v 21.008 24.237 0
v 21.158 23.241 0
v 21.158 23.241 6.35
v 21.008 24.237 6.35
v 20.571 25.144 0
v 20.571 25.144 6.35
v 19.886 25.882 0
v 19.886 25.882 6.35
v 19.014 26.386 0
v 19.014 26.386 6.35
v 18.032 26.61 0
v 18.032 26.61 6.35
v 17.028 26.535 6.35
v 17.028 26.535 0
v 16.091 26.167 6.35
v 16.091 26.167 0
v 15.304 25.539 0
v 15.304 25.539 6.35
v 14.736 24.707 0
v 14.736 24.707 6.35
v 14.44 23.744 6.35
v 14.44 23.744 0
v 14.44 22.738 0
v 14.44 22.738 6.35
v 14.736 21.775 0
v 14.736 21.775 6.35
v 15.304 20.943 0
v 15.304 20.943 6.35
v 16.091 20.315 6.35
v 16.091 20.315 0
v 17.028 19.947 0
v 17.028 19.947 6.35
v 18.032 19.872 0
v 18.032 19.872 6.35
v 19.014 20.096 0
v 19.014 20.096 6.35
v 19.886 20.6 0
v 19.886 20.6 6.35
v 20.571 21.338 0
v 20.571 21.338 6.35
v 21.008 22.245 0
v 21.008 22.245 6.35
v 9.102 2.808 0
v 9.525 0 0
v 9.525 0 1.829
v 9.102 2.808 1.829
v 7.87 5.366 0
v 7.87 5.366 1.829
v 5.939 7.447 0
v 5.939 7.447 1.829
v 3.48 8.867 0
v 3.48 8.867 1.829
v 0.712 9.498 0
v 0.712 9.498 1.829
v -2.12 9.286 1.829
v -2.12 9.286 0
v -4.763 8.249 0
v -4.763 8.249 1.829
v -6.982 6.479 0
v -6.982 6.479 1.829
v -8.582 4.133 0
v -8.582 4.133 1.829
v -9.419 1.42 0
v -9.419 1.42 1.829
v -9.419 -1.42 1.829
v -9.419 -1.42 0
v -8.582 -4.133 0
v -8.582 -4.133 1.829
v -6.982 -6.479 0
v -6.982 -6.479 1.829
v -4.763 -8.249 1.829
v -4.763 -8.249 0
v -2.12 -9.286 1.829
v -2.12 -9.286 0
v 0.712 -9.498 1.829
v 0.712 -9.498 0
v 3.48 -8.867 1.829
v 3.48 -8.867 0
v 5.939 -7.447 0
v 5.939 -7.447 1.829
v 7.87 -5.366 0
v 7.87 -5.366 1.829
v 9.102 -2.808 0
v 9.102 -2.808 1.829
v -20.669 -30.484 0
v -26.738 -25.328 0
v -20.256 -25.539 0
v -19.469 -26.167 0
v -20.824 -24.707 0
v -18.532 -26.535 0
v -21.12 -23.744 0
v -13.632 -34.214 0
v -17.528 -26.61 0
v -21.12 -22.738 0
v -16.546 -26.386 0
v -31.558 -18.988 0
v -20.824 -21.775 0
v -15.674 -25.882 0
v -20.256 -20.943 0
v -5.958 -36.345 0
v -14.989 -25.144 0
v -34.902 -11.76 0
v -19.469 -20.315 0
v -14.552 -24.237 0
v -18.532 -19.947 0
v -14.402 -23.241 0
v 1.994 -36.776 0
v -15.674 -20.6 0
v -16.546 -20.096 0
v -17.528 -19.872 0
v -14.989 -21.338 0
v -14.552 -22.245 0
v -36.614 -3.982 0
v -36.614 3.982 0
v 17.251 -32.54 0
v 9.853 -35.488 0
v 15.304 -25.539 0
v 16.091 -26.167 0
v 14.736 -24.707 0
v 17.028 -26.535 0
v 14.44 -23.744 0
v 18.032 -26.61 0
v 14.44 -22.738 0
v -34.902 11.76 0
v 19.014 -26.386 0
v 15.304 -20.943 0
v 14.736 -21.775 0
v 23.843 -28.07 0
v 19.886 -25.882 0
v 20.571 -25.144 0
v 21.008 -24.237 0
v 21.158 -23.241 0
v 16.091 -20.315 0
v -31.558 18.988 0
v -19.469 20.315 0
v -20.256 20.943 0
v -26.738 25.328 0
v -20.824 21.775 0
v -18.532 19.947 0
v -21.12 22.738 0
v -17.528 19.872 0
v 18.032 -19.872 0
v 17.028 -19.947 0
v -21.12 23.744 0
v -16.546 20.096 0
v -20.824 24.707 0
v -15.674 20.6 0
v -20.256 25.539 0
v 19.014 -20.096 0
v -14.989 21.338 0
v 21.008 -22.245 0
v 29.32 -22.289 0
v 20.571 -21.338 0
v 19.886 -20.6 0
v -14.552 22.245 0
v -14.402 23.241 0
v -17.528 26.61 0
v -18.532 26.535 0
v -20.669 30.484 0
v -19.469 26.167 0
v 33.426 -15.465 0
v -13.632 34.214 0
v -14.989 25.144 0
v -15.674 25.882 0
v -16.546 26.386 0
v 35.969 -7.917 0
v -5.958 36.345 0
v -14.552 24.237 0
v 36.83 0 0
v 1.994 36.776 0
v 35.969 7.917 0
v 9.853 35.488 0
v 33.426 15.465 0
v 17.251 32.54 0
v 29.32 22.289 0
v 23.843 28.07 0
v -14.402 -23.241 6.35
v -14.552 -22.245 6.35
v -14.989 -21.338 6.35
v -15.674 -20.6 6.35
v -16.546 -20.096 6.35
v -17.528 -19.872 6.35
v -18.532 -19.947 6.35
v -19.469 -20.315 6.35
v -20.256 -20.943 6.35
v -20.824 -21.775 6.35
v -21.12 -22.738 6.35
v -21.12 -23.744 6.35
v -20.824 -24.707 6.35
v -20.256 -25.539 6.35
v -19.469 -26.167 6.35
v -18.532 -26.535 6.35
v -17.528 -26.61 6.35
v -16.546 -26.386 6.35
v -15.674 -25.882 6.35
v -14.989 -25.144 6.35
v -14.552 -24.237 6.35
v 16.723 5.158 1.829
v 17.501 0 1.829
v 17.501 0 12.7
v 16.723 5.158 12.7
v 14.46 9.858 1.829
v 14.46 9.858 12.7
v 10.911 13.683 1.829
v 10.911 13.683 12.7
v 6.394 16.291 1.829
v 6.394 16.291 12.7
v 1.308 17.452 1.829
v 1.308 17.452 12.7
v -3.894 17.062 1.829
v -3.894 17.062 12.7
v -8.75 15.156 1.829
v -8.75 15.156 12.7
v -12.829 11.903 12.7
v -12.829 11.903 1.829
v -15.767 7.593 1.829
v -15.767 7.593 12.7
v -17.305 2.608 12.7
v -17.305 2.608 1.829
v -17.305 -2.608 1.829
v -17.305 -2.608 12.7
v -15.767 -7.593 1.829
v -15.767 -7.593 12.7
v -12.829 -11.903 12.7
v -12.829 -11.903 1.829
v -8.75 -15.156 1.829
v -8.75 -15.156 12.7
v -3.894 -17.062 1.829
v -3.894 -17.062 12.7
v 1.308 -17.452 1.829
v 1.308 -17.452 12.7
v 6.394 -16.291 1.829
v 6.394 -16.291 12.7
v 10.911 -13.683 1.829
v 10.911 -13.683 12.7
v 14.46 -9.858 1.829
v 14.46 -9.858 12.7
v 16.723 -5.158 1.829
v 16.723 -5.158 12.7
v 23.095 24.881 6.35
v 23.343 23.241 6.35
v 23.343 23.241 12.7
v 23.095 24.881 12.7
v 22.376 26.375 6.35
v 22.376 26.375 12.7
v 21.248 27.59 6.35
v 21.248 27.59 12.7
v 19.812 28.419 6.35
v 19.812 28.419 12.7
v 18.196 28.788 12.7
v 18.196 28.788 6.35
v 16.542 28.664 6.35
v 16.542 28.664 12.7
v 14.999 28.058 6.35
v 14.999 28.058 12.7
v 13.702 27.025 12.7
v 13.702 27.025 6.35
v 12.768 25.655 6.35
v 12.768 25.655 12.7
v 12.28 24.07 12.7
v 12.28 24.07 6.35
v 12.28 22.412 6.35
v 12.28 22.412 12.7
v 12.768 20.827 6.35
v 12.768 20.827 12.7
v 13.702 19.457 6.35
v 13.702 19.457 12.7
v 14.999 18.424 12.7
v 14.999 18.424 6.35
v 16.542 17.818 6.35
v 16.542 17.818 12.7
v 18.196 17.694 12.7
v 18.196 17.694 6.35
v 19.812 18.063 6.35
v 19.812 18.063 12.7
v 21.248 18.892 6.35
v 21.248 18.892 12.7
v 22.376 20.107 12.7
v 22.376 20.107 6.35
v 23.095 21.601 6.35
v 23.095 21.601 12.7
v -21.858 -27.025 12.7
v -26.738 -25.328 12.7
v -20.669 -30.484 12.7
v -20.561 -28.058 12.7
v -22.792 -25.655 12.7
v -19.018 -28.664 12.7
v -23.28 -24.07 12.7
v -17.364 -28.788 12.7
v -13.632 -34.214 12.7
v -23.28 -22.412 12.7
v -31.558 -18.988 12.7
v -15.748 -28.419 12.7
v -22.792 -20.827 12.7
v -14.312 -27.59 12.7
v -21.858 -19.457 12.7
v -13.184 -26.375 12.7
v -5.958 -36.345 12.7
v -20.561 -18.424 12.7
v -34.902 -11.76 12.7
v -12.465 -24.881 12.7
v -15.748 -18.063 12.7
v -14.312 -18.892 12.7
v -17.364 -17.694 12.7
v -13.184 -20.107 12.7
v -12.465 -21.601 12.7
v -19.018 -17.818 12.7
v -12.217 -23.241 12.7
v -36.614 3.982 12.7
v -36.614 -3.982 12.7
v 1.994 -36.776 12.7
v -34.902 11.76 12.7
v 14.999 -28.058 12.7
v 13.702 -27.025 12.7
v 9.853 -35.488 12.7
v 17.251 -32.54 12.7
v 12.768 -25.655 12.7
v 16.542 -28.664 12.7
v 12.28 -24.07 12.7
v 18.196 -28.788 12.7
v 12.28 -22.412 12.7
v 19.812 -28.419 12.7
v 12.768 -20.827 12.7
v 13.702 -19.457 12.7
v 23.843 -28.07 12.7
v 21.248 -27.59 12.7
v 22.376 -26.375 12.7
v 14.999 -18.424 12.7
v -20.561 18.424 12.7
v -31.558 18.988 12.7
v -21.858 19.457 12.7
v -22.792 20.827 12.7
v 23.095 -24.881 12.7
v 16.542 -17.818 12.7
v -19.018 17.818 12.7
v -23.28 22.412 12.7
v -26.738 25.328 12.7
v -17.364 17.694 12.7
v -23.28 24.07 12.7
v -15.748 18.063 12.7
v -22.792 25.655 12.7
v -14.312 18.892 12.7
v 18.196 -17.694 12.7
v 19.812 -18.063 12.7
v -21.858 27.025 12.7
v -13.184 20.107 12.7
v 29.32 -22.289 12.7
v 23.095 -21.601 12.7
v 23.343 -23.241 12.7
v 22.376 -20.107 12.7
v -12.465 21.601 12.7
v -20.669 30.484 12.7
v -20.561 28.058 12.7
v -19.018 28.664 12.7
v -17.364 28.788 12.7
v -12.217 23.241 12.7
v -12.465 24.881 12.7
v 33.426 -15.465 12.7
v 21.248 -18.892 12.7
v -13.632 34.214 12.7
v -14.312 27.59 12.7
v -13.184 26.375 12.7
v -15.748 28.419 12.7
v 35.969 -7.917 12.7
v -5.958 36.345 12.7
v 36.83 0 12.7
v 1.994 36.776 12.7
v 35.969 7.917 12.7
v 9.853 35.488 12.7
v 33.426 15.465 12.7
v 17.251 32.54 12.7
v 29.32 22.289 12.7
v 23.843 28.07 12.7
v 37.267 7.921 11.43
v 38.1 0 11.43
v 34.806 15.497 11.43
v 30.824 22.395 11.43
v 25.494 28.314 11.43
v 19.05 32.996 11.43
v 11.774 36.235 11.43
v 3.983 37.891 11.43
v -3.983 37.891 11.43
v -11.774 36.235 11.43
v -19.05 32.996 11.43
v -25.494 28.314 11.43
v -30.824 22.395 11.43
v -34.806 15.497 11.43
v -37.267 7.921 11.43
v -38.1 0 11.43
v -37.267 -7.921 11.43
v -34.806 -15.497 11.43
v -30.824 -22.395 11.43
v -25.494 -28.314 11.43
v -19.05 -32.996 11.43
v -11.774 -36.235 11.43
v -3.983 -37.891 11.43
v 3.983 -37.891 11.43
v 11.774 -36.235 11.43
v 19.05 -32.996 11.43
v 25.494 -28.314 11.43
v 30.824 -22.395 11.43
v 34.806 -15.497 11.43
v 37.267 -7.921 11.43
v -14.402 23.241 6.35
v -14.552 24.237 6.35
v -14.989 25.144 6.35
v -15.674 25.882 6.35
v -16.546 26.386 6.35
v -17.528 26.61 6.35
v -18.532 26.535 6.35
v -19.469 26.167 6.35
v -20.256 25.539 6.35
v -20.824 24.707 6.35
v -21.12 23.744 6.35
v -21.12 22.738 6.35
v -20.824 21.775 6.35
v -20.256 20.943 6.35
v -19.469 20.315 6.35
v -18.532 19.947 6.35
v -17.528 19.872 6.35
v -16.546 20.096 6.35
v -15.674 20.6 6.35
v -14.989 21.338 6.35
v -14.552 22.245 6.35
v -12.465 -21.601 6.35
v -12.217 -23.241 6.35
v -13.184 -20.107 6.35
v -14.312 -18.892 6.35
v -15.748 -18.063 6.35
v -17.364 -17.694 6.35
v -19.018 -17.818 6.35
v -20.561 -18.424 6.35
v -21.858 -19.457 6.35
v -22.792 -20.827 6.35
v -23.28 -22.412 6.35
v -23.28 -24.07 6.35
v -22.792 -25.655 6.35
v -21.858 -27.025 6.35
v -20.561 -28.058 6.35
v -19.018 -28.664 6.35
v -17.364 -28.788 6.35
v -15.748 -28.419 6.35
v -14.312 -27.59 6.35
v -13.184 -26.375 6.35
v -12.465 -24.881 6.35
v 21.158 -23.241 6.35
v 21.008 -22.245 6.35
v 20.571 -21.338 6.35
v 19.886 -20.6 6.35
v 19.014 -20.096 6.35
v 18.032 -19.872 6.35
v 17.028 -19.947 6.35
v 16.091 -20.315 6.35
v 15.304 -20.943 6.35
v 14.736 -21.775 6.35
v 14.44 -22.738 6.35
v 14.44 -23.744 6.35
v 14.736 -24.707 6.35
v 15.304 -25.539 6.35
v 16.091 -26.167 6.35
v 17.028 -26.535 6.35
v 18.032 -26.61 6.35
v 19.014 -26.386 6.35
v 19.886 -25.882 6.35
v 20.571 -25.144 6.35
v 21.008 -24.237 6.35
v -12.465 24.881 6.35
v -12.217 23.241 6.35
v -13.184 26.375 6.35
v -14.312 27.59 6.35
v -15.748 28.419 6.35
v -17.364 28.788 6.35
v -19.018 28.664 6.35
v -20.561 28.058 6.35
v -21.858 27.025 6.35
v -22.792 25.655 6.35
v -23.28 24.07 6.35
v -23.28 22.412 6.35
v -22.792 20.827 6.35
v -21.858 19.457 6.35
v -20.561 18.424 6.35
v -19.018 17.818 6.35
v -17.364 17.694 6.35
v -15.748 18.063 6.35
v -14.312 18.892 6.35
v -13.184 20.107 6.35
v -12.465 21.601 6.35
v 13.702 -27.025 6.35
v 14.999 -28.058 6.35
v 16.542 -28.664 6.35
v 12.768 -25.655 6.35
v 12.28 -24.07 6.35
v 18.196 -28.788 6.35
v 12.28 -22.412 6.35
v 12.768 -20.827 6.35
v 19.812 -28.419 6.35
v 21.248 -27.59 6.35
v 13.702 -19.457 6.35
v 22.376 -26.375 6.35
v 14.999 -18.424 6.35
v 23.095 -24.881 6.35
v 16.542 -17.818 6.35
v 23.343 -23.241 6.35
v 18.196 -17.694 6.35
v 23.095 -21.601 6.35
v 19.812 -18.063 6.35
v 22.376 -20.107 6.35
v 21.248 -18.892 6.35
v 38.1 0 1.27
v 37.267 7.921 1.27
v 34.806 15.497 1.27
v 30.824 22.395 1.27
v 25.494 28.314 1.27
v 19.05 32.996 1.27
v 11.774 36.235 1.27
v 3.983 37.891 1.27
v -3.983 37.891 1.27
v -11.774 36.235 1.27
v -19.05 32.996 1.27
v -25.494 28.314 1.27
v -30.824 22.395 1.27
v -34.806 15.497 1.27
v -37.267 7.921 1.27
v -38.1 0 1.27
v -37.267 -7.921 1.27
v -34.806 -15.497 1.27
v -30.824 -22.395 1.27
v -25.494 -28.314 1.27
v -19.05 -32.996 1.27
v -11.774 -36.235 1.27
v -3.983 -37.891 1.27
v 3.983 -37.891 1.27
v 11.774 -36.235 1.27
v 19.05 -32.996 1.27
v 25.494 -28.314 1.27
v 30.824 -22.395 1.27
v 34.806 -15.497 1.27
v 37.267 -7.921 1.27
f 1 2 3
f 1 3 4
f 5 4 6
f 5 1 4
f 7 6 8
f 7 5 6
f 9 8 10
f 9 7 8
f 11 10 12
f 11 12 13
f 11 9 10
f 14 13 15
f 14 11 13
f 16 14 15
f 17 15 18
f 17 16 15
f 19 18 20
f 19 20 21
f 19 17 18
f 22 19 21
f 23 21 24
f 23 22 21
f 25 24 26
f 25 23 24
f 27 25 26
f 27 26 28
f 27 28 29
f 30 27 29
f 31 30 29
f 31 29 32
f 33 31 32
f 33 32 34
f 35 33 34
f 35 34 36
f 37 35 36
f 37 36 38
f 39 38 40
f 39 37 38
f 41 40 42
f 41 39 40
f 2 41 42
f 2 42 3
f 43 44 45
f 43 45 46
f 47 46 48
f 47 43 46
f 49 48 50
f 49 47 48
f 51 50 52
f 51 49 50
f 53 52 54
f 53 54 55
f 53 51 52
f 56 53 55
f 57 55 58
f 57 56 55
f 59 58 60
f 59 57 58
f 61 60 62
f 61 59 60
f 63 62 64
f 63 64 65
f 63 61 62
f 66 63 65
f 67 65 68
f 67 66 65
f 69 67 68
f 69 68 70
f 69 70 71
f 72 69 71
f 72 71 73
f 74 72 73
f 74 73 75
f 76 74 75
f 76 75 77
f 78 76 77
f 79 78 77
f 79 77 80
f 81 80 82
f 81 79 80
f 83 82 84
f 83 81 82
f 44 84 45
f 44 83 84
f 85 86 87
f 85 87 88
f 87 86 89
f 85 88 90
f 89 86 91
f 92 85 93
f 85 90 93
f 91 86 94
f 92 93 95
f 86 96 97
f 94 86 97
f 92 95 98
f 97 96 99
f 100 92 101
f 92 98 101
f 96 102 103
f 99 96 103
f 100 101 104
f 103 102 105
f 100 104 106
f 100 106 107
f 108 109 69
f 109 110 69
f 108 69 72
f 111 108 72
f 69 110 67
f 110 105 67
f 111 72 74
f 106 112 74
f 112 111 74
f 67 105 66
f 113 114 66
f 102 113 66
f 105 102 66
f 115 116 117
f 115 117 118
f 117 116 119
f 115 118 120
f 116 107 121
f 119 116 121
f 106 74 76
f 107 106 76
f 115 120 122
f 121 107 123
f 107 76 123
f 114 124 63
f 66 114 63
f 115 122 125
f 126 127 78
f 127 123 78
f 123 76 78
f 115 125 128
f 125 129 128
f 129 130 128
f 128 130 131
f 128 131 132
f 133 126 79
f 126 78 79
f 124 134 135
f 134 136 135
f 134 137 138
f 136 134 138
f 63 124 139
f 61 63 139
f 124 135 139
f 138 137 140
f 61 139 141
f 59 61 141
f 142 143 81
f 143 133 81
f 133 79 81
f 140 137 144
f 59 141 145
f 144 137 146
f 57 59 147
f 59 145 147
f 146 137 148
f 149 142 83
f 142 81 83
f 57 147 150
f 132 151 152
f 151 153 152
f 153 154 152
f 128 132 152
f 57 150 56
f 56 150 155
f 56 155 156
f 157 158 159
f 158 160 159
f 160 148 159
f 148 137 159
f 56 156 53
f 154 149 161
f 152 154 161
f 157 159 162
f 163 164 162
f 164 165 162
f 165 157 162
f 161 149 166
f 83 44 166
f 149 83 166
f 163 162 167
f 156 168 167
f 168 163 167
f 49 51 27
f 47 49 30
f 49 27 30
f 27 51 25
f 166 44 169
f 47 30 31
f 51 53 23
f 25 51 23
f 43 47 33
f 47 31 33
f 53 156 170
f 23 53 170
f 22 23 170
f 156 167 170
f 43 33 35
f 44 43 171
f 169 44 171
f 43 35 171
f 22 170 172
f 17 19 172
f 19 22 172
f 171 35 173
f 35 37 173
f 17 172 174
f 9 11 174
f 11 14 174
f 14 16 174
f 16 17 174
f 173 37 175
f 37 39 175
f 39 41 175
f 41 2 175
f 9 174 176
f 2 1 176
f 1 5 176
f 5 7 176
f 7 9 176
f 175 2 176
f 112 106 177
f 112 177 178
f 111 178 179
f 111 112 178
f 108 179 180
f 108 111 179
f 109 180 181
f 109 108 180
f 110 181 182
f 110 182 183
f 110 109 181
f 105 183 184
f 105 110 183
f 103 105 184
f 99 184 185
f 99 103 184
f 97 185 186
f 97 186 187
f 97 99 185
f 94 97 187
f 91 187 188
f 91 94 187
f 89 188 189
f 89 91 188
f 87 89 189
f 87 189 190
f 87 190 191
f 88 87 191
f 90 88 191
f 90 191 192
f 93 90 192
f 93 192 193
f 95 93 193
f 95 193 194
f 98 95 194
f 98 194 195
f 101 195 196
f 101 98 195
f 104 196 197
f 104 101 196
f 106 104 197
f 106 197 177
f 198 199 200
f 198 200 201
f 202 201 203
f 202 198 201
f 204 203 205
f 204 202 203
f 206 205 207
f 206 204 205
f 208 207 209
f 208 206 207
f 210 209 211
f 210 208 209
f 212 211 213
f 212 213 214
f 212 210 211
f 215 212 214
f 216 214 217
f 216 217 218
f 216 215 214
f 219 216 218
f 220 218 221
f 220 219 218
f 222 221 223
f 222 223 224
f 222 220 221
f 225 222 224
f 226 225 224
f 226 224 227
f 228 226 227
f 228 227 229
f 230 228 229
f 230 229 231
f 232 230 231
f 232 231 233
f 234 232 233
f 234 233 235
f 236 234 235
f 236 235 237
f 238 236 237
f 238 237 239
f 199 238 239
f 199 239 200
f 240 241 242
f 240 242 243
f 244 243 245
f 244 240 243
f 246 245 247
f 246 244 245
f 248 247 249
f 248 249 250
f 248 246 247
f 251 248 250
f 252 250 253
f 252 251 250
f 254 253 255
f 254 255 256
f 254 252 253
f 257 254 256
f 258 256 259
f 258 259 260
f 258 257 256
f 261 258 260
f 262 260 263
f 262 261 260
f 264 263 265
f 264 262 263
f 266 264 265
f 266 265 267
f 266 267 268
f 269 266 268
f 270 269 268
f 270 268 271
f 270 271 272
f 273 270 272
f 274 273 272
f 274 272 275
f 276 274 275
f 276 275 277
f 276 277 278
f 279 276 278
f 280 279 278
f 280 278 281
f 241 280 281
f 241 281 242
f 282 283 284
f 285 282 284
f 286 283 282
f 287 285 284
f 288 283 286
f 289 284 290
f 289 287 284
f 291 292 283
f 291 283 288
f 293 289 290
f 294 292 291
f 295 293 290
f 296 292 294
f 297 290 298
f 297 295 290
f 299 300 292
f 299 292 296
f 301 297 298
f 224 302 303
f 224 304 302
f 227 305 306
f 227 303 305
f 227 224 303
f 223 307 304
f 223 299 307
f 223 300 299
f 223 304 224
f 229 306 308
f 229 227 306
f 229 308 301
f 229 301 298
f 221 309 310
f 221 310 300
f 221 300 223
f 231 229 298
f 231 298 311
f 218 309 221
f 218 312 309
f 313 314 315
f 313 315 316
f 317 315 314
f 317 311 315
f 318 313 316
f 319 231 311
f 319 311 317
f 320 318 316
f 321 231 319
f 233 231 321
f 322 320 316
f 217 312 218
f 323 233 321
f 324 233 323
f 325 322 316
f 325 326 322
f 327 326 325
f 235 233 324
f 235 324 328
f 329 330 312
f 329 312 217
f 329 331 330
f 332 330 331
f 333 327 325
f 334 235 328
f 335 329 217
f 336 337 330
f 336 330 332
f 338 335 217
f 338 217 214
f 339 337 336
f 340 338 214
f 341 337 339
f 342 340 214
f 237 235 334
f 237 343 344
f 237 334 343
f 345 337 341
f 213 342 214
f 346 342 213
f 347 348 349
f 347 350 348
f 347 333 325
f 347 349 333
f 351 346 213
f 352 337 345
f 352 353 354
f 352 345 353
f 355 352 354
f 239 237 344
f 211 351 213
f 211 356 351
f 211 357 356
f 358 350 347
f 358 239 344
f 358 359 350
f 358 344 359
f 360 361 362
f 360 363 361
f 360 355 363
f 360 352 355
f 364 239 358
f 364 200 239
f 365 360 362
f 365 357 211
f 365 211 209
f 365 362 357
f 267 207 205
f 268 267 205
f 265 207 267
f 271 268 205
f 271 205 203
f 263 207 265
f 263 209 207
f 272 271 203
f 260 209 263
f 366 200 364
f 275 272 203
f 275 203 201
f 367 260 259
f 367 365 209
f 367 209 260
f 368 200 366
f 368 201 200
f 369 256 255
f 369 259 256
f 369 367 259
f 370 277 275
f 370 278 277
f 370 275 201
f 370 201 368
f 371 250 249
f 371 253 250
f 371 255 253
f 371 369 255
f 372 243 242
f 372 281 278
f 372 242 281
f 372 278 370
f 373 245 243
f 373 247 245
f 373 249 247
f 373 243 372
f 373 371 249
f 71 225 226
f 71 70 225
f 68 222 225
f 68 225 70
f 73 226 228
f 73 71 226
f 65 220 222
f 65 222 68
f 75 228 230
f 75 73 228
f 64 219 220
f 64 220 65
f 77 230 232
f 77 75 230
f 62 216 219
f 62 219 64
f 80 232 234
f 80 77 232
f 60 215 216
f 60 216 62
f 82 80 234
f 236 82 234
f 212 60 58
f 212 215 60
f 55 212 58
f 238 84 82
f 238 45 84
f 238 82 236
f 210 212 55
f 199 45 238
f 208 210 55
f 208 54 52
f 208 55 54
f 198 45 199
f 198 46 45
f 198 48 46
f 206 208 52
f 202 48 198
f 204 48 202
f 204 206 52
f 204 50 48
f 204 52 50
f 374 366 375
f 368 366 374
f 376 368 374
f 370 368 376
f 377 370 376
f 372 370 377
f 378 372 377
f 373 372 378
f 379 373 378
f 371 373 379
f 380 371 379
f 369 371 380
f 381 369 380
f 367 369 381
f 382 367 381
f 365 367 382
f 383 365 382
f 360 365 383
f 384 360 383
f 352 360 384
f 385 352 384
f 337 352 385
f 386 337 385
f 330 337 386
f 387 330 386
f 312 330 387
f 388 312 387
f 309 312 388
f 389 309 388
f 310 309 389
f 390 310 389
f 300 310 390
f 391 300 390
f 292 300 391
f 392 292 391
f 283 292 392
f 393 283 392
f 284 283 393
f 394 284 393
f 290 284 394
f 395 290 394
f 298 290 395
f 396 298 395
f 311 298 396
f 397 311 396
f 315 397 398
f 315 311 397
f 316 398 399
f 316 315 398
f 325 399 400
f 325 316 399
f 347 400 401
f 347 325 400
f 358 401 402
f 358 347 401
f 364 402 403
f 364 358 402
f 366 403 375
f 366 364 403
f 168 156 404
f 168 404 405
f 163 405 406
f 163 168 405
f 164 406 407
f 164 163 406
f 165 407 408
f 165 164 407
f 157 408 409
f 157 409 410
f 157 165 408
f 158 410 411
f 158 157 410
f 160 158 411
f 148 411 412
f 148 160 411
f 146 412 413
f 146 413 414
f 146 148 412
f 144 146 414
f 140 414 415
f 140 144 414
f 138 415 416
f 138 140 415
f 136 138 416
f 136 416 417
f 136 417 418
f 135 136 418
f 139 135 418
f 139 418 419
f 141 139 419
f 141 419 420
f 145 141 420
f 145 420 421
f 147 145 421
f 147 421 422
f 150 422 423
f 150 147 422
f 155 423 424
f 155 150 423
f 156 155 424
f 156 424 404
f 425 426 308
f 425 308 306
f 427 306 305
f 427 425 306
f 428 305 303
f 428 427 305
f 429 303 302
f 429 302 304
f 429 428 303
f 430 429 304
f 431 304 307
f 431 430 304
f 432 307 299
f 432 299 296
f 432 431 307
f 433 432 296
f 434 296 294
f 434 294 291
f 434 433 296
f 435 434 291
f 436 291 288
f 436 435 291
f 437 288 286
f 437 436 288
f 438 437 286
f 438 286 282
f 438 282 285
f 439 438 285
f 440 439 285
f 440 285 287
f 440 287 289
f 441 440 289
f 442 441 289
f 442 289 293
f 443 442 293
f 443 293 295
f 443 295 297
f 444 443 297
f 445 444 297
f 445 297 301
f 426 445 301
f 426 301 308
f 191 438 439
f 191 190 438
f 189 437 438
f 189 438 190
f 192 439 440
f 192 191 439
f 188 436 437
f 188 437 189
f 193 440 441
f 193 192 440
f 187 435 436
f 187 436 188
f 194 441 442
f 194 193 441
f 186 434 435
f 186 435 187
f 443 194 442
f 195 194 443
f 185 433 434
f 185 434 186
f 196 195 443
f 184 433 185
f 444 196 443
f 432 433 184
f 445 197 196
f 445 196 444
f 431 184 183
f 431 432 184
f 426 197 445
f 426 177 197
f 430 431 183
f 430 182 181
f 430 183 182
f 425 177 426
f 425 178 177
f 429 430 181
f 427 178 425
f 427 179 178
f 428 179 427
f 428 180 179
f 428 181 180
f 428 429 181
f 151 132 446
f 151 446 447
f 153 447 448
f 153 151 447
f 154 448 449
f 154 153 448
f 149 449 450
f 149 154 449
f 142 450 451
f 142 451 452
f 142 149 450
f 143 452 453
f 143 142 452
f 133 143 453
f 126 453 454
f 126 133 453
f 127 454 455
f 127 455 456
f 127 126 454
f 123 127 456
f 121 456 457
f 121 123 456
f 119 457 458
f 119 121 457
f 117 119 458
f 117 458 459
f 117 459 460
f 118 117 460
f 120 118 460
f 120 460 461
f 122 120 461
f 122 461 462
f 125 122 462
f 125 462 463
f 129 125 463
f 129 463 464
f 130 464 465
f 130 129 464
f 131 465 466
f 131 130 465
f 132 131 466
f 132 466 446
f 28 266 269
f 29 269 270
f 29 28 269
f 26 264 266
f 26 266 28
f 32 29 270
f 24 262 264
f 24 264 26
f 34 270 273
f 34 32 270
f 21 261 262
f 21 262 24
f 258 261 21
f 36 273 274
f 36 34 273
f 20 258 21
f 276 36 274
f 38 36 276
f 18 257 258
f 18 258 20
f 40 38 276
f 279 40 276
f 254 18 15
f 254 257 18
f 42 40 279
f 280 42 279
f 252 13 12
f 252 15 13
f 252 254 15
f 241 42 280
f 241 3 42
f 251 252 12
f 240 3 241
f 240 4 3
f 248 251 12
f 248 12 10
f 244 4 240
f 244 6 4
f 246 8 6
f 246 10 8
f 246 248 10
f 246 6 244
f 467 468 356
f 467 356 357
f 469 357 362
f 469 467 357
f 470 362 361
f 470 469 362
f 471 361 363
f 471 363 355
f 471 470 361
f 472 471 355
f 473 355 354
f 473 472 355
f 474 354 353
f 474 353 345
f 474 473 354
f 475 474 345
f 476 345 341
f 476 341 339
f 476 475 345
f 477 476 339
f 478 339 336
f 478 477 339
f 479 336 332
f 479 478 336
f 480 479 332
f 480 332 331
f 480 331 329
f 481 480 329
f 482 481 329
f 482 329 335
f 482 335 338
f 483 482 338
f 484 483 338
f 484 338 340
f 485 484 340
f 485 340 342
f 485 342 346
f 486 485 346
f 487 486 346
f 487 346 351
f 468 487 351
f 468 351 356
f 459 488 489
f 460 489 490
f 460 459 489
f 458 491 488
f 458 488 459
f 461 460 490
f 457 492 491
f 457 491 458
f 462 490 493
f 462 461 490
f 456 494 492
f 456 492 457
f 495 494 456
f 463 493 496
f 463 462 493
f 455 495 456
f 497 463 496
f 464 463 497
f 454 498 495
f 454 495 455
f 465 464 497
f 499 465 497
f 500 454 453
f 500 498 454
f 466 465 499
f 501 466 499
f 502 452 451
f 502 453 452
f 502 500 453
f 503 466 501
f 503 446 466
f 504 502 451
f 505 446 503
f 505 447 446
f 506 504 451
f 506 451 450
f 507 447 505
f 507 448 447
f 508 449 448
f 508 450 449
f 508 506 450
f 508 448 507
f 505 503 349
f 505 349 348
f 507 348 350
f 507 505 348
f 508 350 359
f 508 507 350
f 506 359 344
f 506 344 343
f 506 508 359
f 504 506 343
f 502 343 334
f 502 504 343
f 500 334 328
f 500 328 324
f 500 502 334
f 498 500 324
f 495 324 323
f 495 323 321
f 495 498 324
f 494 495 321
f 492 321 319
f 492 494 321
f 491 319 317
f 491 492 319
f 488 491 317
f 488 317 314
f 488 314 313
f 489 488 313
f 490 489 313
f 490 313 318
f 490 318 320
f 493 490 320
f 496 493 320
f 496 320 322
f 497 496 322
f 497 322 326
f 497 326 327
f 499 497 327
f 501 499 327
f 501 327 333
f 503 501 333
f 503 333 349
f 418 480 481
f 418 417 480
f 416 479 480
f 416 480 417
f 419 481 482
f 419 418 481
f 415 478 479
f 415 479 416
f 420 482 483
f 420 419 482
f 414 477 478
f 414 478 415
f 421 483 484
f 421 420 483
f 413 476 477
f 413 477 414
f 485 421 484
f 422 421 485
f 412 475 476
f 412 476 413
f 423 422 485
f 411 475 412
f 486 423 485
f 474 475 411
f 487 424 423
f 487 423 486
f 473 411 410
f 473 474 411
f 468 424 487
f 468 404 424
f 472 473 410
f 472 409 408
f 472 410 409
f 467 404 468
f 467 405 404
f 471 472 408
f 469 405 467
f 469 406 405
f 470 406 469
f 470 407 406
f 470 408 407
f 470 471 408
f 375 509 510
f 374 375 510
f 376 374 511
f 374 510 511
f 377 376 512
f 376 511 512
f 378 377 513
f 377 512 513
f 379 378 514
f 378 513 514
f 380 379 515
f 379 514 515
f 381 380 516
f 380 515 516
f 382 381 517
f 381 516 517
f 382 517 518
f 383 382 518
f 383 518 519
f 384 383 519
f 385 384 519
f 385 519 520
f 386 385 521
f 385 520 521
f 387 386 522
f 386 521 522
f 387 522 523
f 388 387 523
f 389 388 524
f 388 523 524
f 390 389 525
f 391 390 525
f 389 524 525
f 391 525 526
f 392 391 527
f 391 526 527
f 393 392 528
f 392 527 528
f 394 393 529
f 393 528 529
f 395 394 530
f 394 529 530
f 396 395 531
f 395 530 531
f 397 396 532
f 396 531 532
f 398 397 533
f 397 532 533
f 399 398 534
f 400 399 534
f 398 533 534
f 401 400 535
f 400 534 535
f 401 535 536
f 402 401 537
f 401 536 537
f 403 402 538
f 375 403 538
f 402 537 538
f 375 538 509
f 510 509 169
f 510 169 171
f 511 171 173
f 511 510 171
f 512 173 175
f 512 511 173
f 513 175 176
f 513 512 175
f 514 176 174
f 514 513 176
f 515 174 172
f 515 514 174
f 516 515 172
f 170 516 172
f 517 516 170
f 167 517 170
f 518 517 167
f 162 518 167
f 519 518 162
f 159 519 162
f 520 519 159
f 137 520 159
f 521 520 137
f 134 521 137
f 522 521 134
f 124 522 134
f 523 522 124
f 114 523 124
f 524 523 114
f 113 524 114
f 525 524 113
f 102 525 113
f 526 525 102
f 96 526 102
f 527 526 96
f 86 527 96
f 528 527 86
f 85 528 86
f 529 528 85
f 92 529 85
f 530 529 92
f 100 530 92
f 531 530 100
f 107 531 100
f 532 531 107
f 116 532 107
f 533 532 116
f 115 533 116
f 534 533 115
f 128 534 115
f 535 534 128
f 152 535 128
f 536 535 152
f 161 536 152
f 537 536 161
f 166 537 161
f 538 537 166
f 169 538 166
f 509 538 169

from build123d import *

# Parameters (mm, degrees)
F0_R     = 38.1
F0_R_2   = 5.5626
F0_R_3   = 17.5006
F1_DEPTH = 12.7
F0_R_4   = 3.3782
F2_DEPTH = 6.35
F0_R_5   = 9.525
F3_DEPTH = 1.8288
F4_SIZE  = 1.27


with BuildPart() as f1:
    # F0 (on Top) → F1 (new body)
    with BuildSketch(Plane.XY):
        Circle(F0_R)
        with Locations((-17.78, -23.241)):
            Circle(F0_R_2, mode=Mode.SUBTRACT)
        with Locations((17.78, -23.241)):
            Circle(F0_R_2, mode=Mode.SUBTRACT)
        with Locations((-17.78, 23.241)):
            Circle(F0_R_2, mode=Mode.SUBTRACT)
        Circle(F0_R_3, mode=Mode.SUBTRACT)
        with Locations((17.78, 23.241)):
            Circle(F0_R_2, mode=Mode.SUBTRACT)
    extrude(amount=F1_DEPTH)

    # F0 (on Top) → F2 (join)
    with BuildSketch(Plane.XY):
        with Locations((-17.78, 23.241)):
            Circle(F0_R_2)
        with Locations((-17.78, 23.241)):
            Circle(F0_R_4, mode=Mode.SUBTRACT)
        with Locations((17.78, 23.241)):
            Circle(F0_R_2)
        with Locations((17.78, 23.241)):
            Circle(F0_R_4, mode=Mode.SUBTRACT)
        with Locations((17.78, -23.241)):
            Circle(F0_R_2)
        with Locations((17.78, -23.241)):
            Circle(F0_R_4, mode=Mode.SUBTRACT)
        with Locations((-17.78, -23.241)):
            Circle(F0_R_2)
        with Locations((-17.78, -23.241)):
            Circle(F0_R_4, mode=Mode.SUBTRACT)
    extrude(amount=F2_DEPTH)

    # F0 (on Top) → F3 (join)
    with BuildSketch(Plane.XY):
        Circle(F0_R_3)
        Circle(F0_R_5, mode=Mode.SUBTRACT)
    extrude(amount=F3_DEPTH)

    # F4
    f4_edges = [f1.edges().sort_by_distance(p)[0] for p in [
        (-38.1, 0, 12.7),
        (-38.1, 0, 0),
    ]]
    chamfer(f4_edges, length=F4_SIZE)


solid = f1.part
